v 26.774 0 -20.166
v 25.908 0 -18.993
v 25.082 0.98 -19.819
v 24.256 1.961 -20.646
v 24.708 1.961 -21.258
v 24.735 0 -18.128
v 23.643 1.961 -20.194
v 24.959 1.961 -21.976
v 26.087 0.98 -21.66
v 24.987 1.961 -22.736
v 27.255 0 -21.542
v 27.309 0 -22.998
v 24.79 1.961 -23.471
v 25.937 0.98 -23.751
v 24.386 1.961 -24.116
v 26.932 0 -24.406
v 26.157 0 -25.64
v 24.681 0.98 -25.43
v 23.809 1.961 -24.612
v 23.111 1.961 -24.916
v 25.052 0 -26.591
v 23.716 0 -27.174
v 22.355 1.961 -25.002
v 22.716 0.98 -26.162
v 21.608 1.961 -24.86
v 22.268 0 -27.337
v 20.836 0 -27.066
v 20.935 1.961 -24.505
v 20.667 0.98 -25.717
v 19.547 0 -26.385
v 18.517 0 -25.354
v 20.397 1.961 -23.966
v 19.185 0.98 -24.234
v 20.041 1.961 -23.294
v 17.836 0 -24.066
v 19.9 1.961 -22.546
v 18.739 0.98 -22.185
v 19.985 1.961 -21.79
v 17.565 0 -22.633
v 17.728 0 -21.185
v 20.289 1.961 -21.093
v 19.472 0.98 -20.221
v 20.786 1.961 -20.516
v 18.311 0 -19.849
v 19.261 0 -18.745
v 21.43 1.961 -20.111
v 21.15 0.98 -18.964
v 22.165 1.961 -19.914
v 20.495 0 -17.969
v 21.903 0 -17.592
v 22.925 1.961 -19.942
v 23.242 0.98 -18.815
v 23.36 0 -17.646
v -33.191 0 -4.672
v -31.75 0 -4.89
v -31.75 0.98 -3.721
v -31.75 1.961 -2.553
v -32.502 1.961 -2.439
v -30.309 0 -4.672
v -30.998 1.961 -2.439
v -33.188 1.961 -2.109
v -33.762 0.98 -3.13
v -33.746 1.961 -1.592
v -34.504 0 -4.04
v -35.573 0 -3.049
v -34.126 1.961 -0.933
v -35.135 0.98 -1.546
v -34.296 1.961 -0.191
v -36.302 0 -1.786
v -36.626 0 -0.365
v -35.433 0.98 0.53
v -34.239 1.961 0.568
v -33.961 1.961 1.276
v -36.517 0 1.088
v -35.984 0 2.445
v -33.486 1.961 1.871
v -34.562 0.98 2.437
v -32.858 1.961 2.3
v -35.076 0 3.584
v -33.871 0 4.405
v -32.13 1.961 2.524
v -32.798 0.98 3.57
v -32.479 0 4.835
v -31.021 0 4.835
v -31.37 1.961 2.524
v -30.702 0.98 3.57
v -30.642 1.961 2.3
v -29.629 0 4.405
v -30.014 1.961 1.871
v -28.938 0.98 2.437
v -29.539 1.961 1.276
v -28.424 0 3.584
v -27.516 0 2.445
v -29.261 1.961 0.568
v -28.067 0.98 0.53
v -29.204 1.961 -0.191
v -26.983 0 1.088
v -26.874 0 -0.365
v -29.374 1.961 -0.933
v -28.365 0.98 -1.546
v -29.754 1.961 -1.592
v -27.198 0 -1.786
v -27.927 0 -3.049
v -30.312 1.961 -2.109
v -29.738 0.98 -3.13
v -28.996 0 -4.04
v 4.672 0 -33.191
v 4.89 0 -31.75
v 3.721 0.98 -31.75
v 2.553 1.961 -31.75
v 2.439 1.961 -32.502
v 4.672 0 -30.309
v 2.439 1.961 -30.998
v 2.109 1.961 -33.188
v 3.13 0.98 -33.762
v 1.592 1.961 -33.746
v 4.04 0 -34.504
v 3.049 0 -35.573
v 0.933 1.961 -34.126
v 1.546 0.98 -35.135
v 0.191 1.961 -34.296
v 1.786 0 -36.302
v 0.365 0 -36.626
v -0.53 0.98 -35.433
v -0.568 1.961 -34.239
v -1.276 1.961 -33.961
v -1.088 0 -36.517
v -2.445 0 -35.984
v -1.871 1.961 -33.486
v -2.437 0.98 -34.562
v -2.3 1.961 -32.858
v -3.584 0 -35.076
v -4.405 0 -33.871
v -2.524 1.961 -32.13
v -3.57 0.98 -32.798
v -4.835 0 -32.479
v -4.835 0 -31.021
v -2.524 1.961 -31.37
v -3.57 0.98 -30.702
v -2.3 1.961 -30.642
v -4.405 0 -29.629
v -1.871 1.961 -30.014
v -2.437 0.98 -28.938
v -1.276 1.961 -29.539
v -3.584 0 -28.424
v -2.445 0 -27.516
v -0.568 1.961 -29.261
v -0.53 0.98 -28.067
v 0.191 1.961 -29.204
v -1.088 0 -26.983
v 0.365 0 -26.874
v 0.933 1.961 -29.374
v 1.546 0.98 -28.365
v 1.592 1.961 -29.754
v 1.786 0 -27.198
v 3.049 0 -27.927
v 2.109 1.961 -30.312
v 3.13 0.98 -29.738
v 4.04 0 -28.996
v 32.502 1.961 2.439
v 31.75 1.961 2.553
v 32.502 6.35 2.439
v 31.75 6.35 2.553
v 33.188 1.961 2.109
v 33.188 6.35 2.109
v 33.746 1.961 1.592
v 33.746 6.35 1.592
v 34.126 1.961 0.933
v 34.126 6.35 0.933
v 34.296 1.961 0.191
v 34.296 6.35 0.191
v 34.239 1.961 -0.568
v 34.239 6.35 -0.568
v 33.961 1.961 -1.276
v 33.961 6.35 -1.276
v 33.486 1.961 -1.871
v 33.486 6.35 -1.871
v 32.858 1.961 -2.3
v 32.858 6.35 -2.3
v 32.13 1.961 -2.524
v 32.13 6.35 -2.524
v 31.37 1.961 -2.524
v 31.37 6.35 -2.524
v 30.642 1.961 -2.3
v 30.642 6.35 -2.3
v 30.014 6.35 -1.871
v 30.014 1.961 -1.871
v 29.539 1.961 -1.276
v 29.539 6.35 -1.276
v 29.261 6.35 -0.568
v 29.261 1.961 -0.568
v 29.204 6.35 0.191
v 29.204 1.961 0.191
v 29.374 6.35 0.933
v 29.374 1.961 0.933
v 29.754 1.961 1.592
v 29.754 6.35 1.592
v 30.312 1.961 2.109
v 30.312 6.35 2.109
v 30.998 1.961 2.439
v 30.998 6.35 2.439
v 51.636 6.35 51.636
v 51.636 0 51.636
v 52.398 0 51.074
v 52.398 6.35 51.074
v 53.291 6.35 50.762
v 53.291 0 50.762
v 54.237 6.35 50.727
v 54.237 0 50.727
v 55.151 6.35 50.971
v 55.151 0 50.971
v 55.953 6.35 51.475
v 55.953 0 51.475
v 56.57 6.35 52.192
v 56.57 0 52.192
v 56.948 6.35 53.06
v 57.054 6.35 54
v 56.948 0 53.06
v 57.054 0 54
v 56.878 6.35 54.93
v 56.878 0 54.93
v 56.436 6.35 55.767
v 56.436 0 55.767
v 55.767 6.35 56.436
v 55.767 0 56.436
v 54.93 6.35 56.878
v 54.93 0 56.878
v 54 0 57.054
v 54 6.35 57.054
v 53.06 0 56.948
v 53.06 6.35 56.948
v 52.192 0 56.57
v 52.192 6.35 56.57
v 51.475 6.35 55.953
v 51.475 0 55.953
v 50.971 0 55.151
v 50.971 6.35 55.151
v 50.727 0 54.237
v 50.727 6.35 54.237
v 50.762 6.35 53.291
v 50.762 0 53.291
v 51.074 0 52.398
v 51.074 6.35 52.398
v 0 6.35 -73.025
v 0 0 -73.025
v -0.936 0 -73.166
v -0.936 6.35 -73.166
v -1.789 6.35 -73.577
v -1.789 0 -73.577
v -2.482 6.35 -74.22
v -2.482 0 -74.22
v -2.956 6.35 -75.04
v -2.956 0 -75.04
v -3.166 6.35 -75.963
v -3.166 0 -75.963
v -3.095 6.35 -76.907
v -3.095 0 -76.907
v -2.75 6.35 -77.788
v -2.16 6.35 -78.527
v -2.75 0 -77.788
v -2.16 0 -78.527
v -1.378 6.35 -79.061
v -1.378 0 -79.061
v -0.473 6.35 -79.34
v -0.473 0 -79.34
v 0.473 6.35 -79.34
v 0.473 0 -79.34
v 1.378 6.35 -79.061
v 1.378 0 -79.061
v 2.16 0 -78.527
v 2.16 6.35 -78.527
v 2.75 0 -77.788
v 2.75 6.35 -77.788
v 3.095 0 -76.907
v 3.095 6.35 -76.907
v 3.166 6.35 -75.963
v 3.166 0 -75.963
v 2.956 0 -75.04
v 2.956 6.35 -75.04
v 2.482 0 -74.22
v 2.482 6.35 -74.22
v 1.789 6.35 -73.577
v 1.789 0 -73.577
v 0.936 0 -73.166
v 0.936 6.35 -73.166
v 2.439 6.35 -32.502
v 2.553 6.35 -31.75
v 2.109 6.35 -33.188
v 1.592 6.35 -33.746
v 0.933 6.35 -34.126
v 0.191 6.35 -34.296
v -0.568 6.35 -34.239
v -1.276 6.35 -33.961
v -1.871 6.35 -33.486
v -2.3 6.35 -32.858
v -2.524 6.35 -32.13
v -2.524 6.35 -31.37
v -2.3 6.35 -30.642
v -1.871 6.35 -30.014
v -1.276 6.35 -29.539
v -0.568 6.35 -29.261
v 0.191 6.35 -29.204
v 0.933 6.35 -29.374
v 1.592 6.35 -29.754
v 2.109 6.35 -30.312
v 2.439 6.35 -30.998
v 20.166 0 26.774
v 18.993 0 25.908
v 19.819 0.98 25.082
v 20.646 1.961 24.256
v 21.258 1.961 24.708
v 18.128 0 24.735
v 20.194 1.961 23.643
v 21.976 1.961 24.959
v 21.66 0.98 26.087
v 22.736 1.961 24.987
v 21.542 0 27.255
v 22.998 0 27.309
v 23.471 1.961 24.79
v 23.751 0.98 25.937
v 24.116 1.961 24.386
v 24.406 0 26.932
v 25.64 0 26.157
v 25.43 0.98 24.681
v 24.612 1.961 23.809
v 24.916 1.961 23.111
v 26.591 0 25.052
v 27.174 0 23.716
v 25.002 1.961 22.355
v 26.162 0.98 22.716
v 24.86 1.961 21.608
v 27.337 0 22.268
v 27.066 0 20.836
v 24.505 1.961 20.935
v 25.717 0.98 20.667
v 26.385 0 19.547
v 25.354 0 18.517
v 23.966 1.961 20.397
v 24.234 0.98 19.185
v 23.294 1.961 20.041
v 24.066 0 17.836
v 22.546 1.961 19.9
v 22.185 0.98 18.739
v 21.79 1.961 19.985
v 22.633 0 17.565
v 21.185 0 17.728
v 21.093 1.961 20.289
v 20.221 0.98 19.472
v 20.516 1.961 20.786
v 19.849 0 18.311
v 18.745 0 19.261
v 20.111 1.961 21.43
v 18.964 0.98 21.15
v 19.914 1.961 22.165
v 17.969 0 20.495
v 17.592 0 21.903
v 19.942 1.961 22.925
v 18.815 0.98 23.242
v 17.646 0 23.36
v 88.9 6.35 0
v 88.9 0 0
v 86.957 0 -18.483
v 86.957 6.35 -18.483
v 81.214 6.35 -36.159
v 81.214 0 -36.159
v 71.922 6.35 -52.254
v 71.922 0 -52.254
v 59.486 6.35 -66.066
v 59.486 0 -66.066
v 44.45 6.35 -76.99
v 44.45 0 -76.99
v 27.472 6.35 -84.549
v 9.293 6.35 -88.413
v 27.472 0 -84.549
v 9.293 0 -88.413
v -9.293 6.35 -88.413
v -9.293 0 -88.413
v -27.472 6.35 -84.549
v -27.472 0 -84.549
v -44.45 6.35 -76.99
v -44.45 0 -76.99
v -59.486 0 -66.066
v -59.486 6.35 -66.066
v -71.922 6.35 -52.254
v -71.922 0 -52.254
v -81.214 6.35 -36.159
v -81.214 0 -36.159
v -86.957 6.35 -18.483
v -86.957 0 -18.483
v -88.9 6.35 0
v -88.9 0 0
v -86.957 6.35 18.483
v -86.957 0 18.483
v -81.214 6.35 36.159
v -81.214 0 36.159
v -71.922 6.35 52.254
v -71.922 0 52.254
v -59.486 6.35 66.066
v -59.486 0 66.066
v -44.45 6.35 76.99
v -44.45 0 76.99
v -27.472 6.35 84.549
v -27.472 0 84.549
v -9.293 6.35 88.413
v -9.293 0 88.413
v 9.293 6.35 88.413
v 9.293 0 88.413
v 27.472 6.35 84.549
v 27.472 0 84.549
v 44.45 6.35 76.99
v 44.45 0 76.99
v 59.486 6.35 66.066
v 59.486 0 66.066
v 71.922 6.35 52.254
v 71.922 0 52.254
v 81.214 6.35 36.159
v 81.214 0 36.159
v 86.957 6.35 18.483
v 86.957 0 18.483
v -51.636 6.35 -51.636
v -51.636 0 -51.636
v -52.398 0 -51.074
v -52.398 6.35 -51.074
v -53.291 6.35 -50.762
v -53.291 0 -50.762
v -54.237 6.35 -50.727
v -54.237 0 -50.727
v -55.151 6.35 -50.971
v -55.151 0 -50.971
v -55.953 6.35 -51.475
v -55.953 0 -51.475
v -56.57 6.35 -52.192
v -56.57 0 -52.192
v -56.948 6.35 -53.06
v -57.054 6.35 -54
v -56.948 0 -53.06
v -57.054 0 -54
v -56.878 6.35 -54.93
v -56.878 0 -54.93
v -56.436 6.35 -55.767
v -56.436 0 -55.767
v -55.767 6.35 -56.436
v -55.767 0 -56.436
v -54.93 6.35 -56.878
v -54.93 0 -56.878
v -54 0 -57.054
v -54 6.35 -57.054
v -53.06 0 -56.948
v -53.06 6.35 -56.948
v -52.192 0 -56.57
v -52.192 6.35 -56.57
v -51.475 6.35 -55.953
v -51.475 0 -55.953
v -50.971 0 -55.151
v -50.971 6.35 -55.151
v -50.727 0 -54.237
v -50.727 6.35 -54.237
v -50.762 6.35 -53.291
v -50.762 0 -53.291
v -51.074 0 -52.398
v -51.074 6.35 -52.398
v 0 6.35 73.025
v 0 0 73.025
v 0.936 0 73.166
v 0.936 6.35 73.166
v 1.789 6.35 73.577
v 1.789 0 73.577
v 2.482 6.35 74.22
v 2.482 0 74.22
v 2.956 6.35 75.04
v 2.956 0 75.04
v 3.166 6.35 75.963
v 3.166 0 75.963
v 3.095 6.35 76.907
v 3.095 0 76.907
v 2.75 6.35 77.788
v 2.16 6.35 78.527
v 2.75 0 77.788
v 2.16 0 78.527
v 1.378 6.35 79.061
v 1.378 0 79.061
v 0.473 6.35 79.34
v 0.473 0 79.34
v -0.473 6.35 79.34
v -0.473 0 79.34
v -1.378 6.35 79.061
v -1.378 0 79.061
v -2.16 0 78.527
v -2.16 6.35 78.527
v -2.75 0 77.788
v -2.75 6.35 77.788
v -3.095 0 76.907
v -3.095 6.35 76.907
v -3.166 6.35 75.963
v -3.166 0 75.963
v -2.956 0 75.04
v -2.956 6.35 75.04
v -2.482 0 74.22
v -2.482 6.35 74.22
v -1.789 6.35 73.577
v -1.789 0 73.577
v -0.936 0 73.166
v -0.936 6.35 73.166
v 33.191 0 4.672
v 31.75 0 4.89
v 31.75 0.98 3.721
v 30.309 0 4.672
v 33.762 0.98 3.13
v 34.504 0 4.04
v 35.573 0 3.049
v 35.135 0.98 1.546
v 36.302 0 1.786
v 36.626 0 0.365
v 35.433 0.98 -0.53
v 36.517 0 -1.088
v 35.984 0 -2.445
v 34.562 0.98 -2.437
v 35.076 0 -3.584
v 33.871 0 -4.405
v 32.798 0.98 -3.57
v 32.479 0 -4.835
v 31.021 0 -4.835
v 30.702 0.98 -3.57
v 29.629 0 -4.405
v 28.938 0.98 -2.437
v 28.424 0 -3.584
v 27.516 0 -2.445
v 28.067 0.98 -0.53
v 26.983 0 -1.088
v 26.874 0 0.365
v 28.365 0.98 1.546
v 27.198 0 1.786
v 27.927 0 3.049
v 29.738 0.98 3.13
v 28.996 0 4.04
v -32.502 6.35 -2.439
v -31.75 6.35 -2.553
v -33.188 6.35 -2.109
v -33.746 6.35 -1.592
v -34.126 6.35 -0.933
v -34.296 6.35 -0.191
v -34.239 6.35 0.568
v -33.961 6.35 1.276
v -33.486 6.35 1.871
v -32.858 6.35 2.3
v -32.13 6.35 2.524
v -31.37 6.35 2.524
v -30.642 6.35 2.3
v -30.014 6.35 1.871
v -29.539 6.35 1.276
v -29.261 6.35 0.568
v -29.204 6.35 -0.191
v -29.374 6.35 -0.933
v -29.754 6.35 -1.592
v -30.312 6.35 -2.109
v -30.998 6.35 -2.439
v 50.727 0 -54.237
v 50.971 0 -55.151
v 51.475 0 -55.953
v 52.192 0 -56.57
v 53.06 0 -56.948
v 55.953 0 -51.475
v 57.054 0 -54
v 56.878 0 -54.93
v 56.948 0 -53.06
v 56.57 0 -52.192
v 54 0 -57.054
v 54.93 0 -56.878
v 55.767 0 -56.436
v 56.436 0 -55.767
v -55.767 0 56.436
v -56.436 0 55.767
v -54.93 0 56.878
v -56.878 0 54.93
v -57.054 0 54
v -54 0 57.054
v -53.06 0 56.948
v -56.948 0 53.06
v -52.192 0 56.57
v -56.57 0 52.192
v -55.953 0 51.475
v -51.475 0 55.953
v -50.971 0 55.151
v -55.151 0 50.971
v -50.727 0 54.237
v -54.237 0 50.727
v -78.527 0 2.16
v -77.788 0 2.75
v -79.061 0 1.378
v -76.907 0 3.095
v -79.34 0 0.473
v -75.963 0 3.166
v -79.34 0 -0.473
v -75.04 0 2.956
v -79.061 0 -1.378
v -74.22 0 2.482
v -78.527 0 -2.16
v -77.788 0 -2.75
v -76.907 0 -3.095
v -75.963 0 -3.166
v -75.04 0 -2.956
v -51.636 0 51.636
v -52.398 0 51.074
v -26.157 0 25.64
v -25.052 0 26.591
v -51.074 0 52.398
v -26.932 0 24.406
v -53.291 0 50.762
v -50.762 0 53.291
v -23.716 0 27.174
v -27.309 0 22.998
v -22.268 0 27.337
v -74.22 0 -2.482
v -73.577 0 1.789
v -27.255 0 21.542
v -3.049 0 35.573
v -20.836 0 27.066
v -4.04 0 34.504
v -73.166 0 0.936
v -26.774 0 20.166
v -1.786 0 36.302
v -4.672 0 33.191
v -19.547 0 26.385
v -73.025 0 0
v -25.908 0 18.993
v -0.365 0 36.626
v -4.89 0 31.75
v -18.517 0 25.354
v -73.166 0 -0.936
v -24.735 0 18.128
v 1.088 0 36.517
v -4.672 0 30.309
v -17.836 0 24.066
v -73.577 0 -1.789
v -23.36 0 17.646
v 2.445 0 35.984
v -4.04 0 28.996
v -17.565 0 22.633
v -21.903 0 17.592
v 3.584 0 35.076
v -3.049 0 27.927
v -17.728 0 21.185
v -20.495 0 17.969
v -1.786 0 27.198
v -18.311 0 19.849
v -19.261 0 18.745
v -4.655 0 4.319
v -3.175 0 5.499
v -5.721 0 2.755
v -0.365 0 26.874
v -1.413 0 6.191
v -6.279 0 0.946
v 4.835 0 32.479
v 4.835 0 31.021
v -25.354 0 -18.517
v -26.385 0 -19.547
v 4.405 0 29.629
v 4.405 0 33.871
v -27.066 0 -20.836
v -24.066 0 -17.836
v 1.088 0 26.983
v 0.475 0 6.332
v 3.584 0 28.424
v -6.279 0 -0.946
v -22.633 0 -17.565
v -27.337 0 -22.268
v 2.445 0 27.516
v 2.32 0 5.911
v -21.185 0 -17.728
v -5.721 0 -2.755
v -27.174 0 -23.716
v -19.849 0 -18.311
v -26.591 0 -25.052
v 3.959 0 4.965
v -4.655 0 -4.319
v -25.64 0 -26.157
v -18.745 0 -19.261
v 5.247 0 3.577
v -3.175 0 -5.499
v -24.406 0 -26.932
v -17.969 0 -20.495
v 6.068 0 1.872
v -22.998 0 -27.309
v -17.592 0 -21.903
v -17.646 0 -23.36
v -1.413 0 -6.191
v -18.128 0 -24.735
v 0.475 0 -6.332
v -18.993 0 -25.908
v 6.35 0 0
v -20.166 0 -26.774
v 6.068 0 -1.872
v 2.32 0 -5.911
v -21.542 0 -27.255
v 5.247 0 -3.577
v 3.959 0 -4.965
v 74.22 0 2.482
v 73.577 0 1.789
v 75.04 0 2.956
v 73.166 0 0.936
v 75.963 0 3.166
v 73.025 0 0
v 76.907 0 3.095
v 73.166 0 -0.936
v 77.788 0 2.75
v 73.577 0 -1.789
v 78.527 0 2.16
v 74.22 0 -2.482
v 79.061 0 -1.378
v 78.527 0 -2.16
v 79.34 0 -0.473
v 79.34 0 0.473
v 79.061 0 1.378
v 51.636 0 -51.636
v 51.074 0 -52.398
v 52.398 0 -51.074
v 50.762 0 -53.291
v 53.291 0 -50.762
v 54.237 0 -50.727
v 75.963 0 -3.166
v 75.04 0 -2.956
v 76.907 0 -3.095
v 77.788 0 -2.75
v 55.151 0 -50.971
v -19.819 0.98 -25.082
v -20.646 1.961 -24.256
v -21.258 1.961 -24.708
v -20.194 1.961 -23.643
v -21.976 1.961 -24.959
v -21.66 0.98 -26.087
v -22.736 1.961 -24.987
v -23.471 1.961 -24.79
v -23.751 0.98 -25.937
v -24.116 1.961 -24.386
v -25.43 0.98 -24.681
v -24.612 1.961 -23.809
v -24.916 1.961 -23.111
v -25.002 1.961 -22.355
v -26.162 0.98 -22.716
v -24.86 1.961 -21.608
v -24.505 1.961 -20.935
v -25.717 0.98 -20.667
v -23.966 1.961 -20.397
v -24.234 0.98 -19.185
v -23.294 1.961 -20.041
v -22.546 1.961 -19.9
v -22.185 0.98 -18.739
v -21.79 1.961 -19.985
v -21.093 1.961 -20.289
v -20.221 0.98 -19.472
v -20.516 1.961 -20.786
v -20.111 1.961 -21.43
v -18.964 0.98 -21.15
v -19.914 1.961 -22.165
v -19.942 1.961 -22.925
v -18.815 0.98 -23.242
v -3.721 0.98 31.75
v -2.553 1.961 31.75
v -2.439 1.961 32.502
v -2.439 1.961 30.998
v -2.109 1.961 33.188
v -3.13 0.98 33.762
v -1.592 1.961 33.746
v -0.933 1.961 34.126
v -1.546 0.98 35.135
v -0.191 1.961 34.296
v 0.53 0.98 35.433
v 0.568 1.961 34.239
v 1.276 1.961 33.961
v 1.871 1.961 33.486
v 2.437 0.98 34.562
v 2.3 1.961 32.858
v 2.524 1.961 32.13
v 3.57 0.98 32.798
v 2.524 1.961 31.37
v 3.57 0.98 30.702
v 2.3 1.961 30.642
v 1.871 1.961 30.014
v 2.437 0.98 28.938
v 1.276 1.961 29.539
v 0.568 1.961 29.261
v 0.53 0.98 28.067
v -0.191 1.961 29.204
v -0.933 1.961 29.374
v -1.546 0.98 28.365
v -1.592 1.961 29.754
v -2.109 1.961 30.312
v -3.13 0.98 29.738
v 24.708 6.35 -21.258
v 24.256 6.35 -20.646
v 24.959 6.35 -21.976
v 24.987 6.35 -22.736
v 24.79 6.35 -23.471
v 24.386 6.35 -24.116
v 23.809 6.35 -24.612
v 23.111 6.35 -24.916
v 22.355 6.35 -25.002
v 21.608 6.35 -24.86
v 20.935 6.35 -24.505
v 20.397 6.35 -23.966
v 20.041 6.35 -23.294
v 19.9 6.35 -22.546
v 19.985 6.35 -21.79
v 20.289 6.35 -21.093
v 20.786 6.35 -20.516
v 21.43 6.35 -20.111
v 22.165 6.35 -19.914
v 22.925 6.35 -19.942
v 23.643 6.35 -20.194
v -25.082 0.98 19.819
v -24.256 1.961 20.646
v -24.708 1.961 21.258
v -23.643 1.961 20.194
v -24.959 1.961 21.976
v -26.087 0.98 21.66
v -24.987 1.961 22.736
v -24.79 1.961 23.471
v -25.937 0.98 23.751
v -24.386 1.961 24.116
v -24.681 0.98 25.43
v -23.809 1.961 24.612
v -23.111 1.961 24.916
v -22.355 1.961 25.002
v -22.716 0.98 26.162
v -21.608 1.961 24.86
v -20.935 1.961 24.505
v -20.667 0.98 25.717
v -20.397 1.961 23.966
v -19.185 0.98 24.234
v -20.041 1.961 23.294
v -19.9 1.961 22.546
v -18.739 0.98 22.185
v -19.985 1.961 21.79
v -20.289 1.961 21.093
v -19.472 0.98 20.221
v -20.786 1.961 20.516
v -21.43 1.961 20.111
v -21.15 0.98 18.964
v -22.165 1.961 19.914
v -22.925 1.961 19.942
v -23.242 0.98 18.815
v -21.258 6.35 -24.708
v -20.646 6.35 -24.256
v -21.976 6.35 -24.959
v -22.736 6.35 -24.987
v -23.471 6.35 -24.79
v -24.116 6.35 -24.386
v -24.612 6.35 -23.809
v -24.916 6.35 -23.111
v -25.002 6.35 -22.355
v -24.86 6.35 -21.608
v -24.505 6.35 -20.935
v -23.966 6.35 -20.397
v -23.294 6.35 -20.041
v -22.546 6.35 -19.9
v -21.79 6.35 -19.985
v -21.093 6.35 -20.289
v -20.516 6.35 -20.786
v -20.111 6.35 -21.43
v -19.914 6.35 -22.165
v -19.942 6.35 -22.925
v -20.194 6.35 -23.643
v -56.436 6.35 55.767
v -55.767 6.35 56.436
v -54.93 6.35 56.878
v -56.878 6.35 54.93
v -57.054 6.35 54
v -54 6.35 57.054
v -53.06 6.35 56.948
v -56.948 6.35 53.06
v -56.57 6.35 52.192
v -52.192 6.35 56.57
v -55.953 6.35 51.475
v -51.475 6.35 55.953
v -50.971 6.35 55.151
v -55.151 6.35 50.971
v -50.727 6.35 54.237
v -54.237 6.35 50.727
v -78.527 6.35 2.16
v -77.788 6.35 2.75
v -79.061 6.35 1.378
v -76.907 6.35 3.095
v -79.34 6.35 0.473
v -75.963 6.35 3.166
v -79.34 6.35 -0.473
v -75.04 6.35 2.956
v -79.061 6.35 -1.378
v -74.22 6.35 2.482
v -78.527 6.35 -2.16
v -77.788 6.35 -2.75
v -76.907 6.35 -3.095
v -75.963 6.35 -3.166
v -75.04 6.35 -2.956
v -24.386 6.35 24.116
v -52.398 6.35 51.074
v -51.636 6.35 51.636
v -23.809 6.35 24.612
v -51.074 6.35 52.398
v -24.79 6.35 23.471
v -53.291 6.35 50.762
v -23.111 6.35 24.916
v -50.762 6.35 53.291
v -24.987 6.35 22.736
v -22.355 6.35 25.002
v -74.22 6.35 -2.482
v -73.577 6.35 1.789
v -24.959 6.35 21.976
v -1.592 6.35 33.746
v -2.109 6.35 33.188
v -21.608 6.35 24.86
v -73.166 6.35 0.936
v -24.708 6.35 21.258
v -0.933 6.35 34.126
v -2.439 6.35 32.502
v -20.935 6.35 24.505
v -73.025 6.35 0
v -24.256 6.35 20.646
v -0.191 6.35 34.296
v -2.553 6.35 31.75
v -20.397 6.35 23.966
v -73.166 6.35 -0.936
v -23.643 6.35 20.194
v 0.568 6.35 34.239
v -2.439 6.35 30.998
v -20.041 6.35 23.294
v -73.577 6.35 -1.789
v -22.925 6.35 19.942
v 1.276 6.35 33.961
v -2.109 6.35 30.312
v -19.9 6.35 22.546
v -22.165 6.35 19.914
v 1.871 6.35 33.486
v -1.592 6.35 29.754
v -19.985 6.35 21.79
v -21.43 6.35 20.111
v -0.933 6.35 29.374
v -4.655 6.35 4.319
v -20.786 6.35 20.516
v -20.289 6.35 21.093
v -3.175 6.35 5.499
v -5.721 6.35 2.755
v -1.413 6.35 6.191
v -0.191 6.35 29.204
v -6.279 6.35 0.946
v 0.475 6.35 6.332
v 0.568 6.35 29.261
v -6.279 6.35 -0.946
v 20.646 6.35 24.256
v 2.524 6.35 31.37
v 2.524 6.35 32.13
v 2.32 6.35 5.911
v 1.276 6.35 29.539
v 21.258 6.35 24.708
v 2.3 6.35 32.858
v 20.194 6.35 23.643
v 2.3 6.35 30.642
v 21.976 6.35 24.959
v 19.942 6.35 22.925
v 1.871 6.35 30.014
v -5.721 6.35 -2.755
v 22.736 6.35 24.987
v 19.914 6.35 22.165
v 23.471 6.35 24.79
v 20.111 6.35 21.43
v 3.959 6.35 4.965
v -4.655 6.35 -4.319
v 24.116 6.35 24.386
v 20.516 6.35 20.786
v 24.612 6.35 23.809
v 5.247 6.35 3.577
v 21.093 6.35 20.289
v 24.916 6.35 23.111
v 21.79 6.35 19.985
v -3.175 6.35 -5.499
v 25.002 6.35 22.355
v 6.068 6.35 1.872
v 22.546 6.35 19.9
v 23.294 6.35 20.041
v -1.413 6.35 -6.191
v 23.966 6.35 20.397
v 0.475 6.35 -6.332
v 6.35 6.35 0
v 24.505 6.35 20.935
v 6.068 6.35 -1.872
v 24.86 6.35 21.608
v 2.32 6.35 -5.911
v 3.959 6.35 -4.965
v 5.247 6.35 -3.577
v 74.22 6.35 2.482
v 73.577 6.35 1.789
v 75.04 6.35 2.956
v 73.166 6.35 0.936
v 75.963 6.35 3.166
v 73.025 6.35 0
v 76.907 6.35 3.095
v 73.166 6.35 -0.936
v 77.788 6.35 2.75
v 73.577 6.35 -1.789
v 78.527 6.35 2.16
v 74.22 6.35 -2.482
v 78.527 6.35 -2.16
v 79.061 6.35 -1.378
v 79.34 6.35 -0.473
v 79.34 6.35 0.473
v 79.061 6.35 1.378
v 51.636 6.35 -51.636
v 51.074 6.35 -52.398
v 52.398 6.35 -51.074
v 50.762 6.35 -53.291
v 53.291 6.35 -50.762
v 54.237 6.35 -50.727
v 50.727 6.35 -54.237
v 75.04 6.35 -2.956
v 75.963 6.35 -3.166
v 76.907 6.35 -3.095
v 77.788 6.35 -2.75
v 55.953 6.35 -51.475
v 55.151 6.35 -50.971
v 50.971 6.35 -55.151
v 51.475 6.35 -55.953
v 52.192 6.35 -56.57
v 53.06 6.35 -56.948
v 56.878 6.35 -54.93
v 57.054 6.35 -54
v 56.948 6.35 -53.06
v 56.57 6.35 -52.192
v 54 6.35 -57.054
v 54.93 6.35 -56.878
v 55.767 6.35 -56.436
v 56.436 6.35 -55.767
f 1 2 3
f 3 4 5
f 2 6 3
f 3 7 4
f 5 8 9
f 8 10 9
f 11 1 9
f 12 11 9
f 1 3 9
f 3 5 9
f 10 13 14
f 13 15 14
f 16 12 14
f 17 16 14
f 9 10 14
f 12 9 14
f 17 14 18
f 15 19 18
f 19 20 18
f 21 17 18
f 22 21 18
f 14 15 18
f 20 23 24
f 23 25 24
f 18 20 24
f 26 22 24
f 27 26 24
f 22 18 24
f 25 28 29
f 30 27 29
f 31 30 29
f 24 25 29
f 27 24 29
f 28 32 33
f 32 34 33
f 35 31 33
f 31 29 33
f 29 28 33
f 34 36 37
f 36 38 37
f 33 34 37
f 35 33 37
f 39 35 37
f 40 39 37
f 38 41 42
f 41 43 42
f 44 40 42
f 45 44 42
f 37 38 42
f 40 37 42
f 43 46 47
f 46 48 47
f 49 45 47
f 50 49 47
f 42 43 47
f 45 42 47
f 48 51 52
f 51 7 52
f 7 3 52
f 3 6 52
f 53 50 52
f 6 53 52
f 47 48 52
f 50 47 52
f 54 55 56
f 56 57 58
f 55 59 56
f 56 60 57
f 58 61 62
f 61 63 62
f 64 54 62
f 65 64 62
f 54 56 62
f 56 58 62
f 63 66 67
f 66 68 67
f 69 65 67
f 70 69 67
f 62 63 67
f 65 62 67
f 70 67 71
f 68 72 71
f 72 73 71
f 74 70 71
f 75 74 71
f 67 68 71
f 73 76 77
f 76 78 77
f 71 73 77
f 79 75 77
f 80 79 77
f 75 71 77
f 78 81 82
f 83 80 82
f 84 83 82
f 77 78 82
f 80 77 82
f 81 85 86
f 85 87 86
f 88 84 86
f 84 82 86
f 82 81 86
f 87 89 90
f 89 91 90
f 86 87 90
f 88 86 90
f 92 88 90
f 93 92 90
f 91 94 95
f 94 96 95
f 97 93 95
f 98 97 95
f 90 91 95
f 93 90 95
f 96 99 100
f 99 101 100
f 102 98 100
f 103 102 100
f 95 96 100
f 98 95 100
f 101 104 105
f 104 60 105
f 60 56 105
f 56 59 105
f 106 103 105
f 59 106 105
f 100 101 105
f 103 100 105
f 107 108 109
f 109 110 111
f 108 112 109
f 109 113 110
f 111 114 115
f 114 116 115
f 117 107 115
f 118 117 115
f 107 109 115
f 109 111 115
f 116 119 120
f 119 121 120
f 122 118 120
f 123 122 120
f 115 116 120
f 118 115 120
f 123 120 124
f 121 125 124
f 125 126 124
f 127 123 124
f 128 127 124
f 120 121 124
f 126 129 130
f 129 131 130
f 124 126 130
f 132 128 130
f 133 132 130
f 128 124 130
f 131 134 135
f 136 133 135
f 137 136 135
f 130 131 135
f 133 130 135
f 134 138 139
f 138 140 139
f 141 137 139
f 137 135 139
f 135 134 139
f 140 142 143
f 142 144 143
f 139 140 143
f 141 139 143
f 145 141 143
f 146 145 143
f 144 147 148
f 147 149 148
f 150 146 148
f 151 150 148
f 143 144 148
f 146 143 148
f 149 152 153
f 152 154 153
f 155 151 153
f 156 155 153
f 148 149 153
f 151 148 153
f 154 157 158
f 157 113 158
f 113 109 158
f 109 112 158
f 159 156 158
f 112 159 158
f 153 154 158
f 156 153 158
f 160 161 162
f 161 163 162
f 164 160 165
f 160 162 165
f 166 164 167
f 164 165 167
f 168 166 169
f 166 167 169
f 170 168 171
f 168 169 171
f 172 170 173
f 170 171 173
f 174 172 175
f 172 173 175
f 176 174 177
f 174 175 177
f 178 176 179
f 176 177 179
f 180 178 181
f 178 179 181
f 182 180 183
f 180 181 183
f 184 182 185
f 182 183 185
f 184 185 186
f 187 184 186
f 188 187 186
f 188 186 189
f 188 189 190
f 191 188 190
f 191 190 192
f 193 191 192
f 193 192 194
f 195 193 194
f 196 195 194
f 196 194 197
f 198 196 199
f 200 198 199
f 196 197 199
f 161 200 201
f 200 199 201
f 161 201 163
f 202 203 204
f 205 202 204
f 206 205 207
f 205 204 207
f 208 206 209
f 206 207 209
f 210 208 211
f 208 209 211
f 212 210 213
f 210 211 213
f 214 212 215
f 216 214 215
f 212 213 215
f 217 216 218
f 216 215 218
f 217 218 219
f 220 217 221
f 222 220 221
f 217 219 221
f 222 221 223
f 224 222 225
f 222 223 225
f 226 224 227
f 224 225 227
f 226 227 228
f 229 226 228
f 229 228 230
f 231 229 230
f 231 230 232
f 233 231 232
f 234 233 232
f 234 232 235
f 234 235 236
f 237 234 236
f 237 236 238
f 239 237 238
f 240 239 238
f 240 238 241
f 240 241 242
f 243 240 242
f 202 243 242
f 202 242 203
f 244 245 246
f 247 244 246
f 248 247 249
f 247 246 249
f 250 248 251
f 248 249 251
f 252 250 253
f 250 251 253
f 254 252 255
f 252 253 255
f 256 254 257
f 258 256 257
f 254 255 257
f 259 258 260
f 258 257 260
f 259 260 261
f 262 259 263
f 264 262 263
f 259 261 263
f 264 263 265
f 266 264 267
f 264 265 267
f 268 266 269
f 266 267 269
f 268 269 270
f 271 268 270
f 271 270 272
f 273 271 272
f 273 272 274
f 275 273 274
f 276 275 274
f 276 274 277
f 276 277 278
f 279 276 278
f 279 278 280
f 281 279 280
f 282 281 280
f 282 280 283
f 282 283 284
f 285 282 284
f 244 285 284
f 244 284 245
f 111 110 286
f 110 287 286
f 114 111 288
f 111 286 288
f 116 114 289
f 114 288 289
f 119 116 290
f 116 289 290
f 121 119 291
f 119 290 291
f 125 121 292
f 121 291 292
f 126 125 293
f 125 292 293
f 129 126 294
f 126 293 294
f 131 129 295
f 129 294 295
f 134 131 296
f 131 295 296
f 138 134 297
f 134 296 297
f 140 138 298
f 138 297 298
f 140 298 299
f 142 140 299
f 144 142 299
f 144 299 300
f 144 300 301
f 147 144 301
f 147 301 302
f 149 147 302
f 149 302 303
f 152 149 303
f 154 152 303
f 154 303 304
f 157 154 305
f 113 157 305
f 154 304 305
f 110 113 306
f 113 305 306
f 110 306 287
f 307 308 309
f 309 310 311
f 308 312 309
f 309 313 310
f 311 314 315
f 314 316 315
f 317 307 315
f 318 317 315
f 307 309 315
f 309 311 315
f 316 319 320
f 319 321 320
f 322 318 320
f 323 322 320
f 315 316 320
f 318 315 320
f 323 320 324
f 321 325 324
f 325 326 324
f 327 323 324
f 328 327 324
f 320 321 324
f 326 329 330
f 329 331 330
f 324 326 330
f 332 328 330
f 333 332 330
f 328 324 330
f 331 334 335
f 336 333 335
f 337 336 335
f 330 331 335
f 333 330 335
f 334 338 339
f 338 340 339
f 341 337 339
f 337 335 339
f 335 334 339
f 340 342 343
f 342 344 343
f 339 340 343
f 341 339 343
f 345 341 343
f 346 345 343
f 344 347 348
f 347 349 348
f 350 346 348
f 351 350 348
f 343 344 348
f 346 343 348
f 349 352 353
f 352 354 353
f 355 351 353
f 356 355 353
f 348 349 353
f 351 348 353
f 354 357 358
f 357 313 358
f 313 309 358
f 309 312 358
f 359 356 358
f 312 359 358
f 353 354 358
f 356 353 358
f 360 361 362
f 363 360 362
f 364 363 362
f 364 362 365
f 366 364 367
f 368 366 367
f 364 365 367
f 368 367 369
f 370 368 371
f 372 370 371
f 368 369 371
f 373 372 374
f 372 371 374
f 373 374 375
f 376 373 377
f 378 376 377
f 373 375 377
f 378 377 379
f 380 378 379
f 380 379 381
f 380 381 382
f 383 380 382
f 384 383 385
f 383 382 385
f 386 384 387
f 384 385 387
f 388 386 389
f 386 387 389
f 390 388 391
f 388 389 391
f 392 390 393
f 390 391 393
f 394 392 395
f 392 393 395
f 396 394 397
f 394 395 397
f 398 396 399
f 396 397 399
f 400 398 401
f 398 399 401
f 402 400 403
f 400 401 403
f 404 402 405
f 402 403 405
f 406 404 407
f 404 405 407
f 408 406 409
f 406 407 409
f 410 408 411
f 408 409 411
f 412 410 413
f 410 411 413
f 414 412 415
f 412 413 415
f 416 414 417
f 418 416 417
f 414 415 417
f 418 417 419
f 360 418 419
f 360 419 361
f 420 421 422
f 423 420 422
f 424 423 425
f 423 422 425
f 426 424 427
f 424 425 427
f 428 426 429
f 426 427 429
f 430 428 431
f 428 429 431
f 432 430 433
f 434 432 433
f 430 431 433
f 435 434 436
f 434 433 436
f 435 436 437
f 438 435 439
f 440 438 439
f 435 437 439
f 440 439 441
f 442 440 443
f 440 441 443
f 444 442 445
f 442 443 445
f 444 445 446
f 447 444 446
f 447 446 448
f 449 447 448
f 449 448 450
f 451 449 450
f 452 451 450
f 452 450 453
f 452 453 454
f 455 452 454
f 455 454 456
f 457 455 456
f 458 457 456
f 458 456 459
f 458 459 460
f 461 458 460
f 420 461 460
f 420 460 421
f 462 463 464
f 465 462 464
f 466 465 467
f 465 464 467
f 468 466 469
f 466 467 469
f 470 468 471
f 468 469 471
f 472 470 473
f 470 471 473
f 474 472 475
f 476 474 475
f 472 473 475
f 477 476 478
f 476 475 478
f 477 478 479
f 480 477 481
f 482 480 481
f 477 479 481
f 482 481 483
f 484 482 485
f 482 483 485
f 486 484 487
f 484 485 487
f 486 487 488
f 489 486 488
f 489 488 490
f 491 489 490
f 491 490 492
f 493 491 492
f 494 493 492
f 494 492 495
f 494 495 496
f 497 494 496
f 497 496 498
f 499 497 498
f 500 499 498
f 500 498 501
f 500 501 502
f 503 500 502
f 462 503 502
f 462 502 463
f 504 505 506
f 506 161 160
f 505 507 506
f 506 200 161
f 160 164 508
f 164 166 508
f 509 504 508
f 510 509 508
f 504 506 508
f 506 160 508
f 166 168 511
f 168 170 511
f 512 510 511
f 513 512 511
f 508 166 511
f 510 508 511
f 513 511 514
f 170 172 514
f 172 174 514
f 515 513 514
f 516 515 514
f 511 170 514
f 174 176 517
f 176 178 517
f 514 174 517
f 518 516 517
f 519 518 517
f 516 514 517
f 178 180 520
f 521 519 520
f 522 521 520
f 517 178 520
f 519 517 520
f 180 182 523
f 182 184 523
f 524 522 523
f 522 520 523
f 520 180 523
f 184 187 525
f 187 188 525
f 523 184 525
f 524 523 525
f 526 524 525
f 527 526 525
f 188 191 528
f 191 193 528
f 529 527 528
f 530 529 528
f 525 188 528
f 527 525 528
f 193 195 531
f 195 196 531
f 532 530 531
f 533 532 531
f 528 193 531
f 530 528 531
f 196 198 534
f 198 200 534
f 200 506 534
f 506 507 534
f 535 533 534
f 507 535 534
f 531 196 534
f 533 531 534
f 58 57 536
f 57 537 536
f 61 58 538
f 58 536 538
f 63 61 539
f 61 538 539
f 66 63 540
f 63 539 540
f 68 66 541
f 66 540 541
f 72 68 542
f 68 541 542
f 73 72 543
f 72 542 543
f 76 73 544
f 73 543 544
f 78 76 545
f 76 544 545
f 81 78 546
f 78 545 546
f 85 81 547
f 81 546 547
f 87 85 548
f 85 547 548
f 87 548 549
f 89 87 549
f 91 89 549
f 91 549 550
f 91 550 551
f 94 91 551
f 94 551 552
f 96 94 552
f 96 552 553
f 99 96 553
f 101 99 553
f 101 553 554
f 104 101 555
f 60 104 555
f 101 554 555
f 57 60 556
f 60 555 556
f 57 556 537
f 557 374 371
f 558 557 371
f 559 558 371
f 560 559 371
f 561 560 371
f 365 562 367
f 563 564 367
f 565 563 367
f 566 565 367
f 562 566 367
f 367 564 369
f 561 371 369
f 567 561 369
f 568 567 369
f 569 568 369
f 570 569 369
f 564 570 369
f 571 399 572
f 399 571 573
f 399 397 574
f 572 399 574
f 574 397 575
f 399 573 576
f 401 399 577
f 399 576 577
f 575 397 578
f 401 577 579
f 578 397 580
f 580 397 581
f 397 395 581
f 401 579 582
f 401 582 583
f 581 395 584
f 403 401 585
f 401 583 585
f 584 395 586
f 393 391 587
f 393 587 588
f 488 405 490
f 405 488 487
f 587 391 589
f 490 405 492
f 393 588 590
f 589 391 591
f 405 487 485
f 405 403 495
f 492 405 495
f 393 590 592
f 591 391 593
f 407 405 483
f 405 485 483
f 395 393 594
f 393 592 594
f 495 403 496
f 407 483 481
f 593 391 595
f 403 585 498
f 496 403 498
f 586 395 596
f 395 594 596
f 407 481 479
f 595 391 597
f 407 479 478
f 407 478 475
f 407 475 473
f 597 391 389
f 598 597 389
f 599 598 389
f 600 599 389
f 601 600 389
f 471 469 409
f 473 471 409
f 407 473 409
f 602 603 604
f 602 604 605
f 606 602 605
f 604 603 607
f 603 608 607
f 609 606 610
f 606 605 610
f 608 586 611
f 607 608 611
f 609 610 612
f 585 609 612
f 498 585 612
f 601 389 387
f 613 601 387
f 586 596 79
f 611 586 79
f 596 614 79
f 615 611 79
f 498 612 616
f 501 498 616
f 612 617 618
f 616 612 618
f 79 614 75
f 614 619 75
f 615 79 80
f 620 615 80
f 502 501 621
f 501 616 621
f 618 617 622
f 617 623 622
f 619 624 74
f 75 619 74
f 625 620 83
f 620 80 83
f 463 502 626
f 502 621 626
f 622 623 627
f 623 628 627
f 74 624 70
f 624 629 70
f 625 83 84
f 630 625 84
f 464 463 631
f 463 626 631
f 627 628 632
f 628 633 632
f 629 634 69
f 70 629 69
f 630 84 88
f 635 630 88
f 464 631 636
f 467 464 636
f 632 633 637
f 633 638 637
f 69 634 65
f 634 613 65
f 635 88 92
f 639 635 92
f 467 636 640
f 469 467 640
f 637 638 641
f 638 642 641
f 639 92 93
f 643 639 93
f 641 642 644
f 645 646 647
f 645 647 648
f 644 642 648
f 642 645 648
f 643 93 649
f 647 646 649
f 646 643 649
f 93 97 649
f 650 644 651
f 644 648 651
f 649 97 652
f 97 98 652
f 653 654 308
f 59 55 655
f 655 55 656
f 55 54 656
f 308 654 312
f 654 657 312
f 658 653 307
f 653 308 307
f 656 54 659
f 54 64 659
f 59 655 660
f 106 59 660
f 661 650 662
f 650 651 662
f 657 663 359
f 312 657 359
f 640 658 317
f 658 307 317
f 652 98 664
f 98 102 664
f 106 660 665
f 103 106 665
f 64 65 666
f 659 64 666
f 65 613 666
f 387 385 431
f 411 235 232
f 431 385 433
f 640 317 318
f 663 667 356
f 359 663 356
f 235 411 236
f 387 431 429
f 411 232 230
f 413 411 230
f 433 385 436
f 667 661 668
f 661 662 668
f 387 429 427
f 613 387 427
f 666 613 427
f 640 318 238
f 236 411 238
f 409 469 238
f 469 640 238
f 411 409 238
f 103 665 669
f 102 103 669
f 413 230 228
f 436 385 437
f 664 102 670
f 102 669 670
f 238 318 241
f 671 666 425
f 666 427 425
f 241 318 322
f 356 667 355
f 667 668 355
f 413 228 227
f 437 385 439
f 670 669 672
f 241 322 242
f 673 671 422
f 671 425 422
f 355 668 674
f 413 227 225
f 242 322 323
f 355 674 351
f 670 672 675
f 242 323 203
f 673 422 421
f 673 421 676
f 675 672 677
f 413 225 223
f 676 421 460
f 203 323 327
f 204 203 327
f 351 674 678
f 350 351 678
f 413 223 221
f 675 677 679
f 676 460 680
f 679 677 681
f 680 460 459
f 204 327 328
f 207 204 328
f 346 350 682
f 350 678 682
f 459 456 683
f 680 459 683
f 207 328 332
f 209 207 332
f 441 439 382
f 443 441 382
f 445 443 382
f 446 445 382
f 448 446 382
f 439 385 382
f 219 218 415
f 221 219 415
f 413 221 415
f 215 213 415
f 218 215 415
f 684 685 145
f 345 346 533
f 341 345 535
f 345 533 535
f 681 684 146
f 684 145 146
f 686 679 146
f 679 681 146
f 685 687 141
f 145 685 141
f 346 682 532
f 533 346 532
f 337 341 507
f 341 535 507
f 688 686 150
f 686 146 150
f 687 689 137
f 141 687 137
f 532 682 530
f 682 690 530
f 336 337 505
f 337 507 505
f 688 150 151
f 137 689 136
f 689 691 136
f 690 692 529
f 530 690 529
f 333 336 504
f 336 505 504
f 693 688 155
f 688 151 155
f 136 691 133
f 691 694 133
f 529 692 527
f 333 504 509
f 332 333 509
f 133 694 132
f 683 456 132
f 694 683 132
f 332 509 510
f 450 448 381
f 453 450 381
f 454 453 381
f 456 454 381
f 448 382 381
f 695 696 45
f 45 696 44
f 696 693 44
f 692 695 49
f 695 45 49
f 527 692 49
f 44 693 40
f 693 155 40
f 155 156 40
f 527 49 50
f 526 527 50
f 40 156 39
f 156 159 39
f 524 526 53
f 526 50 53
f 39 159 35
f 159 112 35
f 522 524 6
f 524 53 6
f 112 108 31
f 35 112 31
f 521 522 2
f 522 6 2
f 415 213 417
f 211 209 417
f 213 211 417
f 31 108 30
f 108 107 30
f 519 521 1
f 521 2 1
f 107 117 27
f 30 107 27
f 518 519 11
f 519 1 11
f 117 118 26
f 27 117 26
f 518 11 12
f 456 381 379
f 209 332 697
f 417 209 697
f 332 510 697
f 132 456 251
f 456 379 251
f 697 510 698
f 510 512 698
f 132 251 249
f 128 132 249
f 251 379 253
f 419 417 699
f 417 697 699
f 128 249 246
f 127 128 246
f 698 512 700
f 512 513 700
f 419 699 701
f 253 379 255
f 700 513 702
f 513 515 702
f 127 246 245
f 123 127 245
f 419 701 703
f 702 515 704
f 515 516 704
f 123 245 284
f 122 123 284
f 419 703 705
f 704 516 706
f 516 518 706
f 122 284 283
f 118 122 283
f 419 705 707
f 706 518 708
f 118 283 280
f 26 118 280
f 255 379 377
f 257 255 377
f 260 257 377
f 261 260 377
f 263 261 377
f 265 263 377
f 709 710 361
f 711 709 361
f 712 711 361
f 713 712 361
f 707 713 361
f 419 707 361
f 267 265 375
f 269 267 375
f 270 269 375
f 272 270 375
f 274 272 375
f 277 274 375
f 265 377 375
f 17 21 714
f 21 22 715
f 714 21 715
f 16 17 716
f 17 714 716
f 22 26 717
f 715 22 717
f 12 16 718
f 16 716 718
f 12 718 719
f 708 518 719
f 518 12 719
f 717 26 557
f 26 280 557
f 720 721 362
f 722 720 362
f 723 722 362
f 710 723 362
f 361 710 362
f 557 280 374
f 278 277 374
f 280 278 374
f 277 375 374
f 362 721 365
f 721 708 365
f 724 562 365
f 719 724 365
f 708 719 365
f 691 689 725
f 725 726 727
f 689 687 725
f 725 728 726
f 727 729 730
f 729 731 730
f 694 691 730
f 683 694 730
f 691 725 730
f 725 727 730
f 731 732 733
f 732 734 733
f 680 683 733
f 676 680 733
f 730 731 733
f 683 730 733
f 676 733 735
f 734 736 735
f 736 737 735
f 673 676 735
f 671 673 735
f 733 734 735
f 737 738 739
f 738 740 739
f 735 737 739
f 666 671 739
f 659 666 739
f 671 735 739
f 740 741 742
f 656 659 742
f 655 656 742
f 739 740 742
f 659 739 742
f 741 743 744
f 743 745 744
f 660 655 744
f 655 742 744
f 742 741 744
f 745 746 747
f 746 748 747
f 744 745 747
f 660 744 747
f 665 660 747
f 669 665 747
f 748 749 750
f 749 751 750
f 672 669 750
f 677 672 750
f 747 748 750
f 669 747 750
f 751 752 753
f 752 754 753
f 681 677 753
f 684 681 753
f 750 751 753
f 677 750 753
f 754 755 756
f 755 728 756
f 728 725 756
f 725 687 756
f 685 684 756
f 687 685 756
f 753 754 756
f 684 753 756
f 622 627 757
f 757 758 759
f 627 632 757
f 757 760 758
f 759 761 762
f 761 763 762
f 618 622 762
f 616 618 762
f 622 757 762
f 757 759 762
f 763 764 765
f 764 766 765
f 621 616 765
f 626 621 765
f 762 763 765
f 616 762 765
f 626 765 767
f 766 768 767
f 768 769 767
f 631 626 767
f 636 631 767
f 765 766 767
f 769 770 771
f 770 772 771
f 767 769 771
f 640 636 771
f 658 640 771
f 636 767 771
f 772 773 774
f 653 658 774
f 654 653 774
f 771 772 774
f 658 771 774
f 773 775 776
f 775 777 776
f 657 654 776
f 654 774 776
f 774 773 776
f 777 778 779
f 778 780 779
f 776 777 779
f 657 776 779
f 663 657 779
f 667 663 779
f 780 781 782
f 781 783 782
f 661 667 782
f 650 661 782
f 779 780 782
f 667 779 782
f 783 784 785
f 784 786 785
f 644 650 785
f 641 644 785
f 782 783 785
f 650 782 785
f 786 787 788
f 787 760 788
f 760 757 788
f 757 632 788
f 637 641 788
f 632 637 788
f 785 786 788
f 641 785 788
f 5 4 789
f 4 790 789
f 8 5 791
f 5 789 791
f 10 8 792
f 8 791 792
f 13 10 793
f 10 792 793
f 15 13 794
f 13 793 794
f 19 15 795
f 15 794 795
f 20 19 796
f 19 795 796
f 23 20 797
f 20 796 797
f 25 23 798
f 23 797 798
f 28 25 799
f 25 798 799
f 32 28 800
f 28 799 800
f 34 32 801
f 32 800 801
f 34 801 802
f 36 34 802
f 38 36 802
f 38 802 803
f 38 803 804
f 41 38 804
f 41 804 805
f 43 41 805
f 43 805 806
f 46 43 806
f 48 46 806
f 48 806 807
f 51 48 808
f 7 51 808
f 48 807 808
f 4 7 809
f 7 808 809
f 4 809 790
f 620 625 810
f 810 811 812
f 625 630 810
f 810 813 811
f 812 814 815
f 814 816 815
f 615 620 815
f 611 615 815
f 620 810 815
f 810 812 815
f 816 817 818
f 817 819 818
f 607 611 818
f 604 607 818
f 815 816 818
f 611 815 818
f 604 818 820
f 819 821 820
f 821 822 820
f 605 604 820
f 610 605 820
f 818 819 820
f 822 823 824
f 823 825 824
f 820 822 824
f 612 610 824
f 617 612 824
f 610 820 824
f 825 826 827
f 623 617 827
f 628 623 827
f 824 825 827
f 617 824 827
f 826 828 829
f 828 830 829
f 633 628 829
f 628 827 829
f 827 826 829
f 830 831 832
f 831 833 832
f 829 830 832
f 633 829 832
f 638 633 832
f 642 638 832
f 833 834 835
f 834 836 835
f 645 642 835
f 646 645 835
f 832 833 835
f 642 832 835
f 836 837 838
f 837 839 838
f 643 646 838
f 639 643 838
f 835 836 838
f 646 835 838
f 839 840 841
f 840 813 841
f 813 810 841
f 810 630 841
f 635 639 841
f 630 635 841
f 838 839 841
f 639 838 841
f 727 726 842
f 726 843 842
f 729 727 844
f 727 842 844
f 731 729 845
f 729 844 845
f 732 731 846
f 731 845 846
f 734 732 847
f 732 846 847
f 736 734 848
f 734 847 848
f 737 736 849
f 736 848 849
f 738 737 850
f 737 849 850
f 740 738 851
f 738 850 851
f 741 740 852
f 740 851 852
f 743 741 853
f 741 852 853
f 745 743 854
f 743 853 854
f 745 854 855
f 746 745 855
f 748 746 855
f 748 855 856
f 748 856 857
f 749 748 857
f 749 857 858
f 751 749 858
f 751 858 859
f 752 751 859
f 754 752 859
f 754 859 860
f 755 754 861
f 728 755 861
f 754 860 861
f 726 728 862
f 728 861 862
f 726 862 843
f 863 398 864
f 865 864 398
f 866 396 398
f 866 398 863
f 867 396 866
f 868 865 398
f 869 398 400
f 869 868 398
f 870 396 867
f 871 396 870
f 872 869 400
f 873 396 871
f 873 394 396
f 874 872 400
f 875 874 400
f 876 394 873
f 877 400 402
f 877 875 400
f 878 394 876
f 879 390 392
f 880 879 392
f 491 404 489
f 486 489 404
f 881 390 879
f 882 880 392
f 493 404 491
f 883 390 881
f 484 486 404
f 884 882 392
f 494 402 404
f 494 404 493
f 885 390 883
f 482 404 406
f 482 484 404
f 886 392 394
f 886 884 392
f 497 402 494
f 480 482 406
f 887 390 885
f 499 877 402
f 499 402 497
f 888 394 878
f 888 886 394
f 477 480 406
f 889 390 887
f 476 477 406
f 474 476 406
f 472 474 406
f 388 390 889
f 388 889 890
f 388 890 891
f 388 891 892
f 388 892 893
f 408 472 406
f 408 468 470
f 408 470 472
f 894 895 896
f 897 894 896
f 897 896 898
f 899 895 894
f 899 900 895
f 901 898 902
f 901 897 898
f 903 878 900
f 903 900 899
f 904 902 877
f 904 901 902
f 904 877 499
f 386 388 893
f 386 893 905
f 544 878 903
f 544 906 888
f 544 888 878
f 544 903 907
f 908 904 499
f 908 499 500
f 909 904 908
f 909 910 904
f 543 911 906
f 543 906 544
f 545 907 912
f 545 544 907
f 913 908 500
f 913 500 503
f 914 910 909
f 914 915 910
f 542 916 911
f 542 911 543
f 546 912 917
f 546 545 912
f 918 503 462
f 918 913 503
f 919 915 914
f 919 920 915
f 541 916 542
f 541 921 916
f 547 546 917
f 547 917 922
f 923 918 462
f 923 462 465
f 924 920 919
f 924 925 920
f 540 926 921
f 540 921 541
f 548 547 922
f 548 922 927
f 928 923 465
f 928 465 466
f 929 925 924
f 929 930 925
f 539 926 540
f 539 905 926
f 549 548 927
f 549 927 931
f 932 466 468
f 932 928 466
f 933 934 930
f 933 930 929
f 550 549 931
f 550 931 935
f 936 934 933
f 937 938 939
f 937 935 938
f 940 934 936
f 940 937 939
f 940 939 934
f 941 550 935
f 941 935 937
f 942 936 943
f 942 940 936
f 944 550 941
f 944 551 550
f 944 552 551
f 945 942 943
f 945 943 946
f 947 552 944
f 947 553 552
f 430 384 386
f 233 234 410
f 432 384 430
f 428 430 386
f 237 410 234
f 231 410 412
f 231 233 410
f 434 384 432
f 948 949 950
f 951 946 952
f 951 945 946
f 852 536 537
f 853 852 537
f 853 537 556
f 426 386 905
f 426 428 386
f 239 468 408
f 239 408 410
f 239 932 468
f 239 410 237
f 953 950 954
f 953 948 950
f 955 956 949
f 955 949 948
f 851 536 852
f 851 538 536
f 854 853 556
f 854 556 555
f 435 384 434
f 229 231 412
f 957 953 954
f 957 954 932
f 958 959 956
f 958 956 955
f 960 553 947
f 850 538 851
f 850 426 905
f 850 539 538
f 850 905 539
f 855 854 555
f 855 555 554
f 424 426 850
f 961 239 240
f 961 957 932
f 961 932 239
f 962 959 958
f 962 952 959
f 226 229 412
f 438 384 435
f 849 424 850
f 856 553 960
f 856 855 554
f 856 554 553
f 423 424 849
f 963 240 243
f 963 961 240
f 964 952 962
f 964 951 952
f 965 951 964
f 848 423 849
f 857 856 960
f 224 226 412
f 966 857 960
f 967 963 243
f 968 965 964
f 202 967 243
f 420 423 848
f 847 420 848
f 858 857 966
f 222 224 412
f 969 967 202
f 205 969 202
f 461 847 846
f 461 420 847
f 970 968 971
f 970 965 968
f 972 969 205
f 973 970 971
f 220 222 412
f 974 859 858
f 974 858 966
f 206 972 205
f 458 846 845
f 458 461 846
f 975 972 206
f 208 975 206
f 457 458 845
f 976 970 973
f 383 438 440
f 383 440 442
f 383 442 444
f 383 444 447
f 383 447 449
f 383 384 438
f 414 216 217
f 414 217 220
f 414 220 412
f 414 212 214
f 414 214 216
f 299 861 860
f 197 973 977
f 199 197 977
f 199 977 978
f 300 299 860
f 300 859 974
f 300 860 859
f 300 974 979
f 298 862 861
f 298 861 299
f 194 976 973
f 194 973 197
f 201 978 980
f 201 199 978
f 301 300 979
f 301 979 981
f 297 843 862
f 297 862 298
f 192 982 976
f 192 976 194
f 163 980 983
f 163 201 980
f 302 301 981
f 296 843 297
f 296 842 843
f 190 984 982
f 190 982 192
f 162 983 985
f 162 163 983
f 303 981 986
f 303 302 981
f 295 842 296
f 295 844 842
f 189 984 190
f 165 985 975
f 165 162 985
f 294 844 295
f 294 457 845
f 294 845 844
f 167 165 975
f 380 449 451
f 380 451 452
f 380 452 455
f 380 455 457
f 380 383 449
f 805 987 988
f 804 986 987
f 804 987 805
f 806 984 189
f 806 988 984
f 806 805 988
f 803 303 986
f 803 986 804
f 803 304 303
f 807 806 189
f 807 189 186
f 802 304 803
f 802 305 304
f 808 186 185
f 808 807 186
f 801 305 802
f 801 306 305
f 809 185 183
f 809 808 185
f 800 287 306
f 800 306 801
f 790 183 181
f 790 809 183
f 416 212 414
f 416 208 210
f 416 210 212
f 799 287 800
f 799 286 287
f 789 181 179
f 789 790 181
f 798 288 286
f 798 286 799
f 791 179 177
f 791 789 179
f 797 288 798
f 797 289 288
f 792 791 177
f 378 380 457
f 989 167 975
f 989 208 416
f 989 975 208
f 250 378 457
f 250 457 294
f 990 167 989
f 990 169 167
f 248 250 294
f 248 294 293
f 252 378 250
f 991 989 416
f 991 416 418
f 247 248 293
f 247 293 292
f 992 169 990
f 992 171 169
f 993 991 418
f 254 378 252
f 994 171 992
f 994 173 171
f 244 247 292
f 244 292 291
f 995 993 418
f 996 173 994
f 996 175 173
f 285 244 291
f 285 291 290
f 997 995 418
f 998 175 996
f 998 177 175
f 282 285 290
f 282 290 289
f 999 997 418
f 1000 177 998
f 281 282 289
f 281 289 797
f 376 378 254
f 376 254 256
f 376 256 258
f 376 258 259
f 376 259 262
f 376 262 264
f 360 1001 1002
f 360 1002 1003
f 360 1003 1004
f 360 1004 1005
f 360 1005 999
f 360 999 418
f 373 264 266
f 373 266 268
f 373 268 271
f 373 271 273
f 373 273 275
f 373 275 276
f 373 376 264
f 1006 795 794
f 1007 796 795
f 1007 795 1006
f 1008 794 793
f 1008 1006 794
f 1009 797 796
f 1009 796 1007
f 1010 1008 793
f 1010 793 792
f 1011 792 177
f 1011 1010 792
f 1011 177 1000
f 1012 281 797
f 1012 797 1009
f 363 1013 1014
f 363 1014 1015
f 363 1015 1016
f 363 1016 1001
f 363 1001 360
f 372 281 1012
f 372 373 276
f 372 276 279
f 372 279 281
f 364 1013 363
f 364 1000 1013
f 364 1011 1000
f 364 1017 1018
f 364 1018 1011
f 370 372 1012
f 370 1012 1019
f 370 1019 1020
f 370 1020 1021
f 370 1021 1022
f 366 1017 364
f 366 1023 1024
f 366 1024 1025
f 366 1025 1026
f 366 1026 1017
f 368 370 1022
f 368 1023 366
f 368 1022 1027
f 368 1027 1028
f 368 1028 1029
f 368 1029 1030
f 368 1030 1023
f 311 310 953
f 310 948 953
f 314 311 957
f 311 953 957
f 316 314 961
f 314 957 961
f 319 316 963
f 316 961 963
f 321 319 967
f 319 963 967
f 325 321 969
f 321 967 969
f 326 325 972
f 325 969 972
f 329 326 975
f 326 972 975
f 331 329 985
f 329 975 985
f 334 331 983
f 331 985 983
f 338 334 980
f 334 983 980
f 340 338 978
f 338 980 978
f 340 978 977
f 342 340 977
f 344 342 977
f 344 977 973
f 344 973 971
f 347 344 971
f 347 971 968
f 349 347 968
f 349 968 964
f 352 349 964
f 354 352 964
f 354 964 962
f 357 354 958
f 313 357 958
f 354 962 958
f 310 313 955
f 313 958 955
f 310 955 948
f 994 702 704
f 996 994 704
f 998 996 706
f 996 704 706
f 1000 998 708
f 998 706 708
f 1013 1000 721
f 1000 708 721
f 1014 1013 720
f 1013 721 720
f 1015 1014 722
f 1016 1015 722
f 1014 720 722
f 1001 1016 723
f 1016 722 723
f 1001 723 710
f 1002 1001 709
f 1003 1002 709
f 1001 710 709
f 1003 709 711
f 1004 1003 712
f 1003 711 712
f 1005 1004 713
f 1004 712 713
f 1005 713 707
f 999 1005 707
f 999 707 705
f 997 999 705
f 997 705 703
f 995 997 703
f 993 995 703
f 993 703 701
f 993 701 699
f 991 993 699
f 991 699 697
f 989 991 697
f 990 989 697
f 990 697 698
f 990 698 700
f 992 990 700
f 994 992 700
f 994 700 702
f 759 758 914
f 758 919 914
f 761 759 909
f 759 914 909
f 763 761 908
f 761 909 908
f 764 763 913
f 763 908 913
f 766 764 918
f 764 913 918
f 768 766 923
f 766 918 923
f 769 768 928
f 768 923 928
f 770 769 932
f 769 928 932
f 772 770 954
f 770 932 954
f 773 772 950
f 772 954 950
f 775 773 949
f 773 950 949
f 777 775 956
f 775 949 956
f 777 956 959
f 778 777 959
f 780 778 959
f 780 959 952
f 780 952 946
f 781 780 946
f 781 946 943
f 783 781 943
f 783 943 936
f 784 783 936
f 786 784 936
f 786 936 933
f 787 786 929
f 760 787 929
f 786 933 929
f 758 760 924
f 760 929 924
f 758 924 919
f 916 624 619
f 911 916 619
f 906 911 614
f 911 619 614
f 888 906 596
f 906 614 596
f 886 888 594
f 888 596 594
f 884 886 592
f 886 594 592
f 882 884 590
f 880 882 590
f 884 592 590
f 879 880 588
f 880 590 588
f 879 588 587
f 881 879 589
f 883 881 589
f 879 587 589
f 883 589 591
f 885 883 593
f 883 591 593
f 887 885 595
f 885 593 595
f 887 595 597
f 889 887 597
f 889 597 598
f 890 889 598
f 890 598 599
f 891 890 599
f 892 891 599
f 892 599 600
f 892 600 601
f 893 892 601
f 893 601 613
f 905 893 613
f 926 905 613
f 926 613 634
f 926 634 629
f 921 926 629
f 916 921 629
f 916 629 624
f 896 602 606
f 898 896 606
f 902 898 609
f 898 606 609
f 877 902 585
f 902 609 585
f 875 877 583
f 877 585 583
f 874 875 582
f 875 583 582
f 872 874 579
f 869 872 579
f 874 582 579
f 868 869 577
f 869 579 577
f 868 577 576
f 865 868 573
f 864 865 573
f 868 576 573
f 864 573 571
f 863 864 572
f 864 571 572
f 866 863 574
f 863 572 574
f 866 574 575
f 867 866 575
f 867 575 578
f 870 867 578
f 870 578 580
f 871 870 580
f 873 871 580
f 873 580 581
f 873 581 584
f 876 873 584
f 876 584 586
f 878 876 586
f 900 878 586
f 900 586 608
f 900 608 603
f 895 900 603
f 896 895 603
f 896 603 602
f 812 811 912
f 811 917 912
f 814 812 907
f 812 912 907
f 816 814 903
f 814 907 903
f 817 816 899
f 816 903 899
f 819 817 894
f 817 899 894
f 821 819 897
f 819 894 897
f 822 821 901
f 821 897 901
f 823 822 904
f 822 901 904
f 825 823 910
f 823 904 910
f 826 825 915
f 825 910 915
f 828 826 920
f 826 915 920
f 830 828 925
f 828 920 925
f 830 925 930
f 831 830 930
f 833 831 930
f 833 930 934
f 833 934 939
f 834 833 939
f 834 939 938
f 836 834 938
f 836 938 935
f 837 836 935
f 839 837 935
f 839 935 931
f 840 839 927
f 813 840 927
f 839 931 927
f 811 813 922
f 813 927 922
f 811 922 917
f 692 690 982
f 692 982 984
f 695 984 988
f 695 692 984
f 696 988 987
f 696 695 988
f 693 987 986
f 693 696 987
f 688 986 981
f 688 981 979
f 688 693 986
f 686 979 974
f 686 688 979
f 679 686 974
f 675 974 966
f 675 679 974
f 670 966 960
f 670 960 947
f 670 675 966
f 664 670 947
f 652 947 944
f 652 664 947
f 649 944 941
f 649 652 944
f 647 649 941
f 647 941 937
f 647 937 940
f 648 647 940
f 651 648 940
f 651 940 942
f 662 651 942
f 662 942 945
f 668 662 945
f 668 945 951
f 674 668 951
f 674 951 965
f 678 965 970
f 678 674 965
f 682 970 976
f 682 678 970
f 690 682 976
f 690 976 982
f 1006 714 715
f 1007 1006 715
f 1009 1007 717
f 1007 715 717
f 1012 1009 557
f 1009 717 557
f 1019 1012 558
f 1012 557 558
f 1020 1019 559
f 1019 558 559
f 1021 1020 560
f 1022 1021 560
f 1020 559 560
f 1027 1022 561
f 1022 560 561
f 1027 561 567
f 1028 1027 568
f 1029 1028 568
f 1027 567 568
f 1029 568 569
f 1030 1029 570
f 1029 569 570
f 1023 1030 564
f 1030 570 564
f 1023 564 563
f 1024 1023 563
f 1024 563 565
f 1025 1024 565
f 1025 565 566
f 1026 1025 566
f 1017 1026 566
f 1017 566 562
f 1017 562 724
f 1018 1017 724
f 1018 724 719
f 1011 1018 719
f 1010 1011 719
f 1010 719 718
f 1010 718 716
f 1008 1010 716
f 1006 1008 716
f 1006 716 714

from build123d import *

# Parameters (mm, degrees)
SKETCH1_R                                          = 88.9
SKETCH1_R_2                                        = 6.35
BOSS_EXTRUDE1_DEPTH                                = 6.35
CSK_FOR_10_FLAT_HEAD_MACHINE_SCREW_100_D           = 5.1054
CSK_FOR_10_FLAT_HEAD_MACHINE_SCREW_100_CSINK_D     = 9.779
CSK_FOR_10_FLAT_HEAD_MACHINE_SCREW_100_CSINK_ANGLE = 100
F_1_4_0_25_DIAMETER_HOLE1_D                        = 6.35
CIRPATTERN1_COUNT                                  = 8


with BuildPart() as part:
    # Sketch1 → Boss-Extrude1 (new body)
    with BuildSketch(Plane(origin=(0, 0, 0), x_dir=(1, 0, 0), z_dir=(0, 1, 0))):
        Circle(SKETCH1_R)
        Circle(SKETCH1_R_2, mode=Mode.SUBTRACT)
    extrude(amount=BOSS_EXTRUDE1_DEPTH)

    # CSK for #10 Flat Head Machine Screw (100)1 (through all)
    with Locations(Plane(origin=(31.75, 0, 0), x_dir=(0, 0, -1), z_dir=(0, -1, 0))):
        with Locations((0, 0)):
            csk_for_10_flat_head_machine_screw_100 = CounterSinkHole(CSK_FOR_10_FLAT_HEAD_MACHINE_SCREW_100_D / 2, CSK_FOR_10_FLAT_HEAD_MACHINE_SCREW_100_CSINK_D / 2, counter_sink_angle=CSK_FOR_10_FLAT_HEAD_MACHINE_SCREW_100_CSINK_ANGLE)

    # 1/4 (0.25) Diameter Hole1 (through all)
    with Locations(Plane(origin=(0, 6.35, 0), x_dir=(1, 0, 0), z_dir=(0, 1, 0))):
        with Locations((76.2, 0)):
            f_1_4_0_25_diameter_hole1 = Hole(F_1_4_0_25_DIAMETER_HOLE1_D / 2)

    # CirPattern1: CSK for #10 Flat Head Machine Screw (100)1, 1/4 (0.25) Diameter Hole1 ×8 about axis
    cirpattern1_axis = Axis((0, 0, 0), (0, 1, 0))
    for i in range(1, CIRPATTERN1_COUNT):
        add(csk_for_10_flat_head_machine_screw_100.rotate(cirpattern1_axis, i * 360 / CIRPATTERN1_COUNT), mode=Mode.SUBTRACT)
        add(f_1_4_0_25_diameter_hole1.rotate(cirpattern1_axis, i * 360 / CIRPATTERN1_COUNT), mode=Mode.SUBTRACT)


solid = part.part
